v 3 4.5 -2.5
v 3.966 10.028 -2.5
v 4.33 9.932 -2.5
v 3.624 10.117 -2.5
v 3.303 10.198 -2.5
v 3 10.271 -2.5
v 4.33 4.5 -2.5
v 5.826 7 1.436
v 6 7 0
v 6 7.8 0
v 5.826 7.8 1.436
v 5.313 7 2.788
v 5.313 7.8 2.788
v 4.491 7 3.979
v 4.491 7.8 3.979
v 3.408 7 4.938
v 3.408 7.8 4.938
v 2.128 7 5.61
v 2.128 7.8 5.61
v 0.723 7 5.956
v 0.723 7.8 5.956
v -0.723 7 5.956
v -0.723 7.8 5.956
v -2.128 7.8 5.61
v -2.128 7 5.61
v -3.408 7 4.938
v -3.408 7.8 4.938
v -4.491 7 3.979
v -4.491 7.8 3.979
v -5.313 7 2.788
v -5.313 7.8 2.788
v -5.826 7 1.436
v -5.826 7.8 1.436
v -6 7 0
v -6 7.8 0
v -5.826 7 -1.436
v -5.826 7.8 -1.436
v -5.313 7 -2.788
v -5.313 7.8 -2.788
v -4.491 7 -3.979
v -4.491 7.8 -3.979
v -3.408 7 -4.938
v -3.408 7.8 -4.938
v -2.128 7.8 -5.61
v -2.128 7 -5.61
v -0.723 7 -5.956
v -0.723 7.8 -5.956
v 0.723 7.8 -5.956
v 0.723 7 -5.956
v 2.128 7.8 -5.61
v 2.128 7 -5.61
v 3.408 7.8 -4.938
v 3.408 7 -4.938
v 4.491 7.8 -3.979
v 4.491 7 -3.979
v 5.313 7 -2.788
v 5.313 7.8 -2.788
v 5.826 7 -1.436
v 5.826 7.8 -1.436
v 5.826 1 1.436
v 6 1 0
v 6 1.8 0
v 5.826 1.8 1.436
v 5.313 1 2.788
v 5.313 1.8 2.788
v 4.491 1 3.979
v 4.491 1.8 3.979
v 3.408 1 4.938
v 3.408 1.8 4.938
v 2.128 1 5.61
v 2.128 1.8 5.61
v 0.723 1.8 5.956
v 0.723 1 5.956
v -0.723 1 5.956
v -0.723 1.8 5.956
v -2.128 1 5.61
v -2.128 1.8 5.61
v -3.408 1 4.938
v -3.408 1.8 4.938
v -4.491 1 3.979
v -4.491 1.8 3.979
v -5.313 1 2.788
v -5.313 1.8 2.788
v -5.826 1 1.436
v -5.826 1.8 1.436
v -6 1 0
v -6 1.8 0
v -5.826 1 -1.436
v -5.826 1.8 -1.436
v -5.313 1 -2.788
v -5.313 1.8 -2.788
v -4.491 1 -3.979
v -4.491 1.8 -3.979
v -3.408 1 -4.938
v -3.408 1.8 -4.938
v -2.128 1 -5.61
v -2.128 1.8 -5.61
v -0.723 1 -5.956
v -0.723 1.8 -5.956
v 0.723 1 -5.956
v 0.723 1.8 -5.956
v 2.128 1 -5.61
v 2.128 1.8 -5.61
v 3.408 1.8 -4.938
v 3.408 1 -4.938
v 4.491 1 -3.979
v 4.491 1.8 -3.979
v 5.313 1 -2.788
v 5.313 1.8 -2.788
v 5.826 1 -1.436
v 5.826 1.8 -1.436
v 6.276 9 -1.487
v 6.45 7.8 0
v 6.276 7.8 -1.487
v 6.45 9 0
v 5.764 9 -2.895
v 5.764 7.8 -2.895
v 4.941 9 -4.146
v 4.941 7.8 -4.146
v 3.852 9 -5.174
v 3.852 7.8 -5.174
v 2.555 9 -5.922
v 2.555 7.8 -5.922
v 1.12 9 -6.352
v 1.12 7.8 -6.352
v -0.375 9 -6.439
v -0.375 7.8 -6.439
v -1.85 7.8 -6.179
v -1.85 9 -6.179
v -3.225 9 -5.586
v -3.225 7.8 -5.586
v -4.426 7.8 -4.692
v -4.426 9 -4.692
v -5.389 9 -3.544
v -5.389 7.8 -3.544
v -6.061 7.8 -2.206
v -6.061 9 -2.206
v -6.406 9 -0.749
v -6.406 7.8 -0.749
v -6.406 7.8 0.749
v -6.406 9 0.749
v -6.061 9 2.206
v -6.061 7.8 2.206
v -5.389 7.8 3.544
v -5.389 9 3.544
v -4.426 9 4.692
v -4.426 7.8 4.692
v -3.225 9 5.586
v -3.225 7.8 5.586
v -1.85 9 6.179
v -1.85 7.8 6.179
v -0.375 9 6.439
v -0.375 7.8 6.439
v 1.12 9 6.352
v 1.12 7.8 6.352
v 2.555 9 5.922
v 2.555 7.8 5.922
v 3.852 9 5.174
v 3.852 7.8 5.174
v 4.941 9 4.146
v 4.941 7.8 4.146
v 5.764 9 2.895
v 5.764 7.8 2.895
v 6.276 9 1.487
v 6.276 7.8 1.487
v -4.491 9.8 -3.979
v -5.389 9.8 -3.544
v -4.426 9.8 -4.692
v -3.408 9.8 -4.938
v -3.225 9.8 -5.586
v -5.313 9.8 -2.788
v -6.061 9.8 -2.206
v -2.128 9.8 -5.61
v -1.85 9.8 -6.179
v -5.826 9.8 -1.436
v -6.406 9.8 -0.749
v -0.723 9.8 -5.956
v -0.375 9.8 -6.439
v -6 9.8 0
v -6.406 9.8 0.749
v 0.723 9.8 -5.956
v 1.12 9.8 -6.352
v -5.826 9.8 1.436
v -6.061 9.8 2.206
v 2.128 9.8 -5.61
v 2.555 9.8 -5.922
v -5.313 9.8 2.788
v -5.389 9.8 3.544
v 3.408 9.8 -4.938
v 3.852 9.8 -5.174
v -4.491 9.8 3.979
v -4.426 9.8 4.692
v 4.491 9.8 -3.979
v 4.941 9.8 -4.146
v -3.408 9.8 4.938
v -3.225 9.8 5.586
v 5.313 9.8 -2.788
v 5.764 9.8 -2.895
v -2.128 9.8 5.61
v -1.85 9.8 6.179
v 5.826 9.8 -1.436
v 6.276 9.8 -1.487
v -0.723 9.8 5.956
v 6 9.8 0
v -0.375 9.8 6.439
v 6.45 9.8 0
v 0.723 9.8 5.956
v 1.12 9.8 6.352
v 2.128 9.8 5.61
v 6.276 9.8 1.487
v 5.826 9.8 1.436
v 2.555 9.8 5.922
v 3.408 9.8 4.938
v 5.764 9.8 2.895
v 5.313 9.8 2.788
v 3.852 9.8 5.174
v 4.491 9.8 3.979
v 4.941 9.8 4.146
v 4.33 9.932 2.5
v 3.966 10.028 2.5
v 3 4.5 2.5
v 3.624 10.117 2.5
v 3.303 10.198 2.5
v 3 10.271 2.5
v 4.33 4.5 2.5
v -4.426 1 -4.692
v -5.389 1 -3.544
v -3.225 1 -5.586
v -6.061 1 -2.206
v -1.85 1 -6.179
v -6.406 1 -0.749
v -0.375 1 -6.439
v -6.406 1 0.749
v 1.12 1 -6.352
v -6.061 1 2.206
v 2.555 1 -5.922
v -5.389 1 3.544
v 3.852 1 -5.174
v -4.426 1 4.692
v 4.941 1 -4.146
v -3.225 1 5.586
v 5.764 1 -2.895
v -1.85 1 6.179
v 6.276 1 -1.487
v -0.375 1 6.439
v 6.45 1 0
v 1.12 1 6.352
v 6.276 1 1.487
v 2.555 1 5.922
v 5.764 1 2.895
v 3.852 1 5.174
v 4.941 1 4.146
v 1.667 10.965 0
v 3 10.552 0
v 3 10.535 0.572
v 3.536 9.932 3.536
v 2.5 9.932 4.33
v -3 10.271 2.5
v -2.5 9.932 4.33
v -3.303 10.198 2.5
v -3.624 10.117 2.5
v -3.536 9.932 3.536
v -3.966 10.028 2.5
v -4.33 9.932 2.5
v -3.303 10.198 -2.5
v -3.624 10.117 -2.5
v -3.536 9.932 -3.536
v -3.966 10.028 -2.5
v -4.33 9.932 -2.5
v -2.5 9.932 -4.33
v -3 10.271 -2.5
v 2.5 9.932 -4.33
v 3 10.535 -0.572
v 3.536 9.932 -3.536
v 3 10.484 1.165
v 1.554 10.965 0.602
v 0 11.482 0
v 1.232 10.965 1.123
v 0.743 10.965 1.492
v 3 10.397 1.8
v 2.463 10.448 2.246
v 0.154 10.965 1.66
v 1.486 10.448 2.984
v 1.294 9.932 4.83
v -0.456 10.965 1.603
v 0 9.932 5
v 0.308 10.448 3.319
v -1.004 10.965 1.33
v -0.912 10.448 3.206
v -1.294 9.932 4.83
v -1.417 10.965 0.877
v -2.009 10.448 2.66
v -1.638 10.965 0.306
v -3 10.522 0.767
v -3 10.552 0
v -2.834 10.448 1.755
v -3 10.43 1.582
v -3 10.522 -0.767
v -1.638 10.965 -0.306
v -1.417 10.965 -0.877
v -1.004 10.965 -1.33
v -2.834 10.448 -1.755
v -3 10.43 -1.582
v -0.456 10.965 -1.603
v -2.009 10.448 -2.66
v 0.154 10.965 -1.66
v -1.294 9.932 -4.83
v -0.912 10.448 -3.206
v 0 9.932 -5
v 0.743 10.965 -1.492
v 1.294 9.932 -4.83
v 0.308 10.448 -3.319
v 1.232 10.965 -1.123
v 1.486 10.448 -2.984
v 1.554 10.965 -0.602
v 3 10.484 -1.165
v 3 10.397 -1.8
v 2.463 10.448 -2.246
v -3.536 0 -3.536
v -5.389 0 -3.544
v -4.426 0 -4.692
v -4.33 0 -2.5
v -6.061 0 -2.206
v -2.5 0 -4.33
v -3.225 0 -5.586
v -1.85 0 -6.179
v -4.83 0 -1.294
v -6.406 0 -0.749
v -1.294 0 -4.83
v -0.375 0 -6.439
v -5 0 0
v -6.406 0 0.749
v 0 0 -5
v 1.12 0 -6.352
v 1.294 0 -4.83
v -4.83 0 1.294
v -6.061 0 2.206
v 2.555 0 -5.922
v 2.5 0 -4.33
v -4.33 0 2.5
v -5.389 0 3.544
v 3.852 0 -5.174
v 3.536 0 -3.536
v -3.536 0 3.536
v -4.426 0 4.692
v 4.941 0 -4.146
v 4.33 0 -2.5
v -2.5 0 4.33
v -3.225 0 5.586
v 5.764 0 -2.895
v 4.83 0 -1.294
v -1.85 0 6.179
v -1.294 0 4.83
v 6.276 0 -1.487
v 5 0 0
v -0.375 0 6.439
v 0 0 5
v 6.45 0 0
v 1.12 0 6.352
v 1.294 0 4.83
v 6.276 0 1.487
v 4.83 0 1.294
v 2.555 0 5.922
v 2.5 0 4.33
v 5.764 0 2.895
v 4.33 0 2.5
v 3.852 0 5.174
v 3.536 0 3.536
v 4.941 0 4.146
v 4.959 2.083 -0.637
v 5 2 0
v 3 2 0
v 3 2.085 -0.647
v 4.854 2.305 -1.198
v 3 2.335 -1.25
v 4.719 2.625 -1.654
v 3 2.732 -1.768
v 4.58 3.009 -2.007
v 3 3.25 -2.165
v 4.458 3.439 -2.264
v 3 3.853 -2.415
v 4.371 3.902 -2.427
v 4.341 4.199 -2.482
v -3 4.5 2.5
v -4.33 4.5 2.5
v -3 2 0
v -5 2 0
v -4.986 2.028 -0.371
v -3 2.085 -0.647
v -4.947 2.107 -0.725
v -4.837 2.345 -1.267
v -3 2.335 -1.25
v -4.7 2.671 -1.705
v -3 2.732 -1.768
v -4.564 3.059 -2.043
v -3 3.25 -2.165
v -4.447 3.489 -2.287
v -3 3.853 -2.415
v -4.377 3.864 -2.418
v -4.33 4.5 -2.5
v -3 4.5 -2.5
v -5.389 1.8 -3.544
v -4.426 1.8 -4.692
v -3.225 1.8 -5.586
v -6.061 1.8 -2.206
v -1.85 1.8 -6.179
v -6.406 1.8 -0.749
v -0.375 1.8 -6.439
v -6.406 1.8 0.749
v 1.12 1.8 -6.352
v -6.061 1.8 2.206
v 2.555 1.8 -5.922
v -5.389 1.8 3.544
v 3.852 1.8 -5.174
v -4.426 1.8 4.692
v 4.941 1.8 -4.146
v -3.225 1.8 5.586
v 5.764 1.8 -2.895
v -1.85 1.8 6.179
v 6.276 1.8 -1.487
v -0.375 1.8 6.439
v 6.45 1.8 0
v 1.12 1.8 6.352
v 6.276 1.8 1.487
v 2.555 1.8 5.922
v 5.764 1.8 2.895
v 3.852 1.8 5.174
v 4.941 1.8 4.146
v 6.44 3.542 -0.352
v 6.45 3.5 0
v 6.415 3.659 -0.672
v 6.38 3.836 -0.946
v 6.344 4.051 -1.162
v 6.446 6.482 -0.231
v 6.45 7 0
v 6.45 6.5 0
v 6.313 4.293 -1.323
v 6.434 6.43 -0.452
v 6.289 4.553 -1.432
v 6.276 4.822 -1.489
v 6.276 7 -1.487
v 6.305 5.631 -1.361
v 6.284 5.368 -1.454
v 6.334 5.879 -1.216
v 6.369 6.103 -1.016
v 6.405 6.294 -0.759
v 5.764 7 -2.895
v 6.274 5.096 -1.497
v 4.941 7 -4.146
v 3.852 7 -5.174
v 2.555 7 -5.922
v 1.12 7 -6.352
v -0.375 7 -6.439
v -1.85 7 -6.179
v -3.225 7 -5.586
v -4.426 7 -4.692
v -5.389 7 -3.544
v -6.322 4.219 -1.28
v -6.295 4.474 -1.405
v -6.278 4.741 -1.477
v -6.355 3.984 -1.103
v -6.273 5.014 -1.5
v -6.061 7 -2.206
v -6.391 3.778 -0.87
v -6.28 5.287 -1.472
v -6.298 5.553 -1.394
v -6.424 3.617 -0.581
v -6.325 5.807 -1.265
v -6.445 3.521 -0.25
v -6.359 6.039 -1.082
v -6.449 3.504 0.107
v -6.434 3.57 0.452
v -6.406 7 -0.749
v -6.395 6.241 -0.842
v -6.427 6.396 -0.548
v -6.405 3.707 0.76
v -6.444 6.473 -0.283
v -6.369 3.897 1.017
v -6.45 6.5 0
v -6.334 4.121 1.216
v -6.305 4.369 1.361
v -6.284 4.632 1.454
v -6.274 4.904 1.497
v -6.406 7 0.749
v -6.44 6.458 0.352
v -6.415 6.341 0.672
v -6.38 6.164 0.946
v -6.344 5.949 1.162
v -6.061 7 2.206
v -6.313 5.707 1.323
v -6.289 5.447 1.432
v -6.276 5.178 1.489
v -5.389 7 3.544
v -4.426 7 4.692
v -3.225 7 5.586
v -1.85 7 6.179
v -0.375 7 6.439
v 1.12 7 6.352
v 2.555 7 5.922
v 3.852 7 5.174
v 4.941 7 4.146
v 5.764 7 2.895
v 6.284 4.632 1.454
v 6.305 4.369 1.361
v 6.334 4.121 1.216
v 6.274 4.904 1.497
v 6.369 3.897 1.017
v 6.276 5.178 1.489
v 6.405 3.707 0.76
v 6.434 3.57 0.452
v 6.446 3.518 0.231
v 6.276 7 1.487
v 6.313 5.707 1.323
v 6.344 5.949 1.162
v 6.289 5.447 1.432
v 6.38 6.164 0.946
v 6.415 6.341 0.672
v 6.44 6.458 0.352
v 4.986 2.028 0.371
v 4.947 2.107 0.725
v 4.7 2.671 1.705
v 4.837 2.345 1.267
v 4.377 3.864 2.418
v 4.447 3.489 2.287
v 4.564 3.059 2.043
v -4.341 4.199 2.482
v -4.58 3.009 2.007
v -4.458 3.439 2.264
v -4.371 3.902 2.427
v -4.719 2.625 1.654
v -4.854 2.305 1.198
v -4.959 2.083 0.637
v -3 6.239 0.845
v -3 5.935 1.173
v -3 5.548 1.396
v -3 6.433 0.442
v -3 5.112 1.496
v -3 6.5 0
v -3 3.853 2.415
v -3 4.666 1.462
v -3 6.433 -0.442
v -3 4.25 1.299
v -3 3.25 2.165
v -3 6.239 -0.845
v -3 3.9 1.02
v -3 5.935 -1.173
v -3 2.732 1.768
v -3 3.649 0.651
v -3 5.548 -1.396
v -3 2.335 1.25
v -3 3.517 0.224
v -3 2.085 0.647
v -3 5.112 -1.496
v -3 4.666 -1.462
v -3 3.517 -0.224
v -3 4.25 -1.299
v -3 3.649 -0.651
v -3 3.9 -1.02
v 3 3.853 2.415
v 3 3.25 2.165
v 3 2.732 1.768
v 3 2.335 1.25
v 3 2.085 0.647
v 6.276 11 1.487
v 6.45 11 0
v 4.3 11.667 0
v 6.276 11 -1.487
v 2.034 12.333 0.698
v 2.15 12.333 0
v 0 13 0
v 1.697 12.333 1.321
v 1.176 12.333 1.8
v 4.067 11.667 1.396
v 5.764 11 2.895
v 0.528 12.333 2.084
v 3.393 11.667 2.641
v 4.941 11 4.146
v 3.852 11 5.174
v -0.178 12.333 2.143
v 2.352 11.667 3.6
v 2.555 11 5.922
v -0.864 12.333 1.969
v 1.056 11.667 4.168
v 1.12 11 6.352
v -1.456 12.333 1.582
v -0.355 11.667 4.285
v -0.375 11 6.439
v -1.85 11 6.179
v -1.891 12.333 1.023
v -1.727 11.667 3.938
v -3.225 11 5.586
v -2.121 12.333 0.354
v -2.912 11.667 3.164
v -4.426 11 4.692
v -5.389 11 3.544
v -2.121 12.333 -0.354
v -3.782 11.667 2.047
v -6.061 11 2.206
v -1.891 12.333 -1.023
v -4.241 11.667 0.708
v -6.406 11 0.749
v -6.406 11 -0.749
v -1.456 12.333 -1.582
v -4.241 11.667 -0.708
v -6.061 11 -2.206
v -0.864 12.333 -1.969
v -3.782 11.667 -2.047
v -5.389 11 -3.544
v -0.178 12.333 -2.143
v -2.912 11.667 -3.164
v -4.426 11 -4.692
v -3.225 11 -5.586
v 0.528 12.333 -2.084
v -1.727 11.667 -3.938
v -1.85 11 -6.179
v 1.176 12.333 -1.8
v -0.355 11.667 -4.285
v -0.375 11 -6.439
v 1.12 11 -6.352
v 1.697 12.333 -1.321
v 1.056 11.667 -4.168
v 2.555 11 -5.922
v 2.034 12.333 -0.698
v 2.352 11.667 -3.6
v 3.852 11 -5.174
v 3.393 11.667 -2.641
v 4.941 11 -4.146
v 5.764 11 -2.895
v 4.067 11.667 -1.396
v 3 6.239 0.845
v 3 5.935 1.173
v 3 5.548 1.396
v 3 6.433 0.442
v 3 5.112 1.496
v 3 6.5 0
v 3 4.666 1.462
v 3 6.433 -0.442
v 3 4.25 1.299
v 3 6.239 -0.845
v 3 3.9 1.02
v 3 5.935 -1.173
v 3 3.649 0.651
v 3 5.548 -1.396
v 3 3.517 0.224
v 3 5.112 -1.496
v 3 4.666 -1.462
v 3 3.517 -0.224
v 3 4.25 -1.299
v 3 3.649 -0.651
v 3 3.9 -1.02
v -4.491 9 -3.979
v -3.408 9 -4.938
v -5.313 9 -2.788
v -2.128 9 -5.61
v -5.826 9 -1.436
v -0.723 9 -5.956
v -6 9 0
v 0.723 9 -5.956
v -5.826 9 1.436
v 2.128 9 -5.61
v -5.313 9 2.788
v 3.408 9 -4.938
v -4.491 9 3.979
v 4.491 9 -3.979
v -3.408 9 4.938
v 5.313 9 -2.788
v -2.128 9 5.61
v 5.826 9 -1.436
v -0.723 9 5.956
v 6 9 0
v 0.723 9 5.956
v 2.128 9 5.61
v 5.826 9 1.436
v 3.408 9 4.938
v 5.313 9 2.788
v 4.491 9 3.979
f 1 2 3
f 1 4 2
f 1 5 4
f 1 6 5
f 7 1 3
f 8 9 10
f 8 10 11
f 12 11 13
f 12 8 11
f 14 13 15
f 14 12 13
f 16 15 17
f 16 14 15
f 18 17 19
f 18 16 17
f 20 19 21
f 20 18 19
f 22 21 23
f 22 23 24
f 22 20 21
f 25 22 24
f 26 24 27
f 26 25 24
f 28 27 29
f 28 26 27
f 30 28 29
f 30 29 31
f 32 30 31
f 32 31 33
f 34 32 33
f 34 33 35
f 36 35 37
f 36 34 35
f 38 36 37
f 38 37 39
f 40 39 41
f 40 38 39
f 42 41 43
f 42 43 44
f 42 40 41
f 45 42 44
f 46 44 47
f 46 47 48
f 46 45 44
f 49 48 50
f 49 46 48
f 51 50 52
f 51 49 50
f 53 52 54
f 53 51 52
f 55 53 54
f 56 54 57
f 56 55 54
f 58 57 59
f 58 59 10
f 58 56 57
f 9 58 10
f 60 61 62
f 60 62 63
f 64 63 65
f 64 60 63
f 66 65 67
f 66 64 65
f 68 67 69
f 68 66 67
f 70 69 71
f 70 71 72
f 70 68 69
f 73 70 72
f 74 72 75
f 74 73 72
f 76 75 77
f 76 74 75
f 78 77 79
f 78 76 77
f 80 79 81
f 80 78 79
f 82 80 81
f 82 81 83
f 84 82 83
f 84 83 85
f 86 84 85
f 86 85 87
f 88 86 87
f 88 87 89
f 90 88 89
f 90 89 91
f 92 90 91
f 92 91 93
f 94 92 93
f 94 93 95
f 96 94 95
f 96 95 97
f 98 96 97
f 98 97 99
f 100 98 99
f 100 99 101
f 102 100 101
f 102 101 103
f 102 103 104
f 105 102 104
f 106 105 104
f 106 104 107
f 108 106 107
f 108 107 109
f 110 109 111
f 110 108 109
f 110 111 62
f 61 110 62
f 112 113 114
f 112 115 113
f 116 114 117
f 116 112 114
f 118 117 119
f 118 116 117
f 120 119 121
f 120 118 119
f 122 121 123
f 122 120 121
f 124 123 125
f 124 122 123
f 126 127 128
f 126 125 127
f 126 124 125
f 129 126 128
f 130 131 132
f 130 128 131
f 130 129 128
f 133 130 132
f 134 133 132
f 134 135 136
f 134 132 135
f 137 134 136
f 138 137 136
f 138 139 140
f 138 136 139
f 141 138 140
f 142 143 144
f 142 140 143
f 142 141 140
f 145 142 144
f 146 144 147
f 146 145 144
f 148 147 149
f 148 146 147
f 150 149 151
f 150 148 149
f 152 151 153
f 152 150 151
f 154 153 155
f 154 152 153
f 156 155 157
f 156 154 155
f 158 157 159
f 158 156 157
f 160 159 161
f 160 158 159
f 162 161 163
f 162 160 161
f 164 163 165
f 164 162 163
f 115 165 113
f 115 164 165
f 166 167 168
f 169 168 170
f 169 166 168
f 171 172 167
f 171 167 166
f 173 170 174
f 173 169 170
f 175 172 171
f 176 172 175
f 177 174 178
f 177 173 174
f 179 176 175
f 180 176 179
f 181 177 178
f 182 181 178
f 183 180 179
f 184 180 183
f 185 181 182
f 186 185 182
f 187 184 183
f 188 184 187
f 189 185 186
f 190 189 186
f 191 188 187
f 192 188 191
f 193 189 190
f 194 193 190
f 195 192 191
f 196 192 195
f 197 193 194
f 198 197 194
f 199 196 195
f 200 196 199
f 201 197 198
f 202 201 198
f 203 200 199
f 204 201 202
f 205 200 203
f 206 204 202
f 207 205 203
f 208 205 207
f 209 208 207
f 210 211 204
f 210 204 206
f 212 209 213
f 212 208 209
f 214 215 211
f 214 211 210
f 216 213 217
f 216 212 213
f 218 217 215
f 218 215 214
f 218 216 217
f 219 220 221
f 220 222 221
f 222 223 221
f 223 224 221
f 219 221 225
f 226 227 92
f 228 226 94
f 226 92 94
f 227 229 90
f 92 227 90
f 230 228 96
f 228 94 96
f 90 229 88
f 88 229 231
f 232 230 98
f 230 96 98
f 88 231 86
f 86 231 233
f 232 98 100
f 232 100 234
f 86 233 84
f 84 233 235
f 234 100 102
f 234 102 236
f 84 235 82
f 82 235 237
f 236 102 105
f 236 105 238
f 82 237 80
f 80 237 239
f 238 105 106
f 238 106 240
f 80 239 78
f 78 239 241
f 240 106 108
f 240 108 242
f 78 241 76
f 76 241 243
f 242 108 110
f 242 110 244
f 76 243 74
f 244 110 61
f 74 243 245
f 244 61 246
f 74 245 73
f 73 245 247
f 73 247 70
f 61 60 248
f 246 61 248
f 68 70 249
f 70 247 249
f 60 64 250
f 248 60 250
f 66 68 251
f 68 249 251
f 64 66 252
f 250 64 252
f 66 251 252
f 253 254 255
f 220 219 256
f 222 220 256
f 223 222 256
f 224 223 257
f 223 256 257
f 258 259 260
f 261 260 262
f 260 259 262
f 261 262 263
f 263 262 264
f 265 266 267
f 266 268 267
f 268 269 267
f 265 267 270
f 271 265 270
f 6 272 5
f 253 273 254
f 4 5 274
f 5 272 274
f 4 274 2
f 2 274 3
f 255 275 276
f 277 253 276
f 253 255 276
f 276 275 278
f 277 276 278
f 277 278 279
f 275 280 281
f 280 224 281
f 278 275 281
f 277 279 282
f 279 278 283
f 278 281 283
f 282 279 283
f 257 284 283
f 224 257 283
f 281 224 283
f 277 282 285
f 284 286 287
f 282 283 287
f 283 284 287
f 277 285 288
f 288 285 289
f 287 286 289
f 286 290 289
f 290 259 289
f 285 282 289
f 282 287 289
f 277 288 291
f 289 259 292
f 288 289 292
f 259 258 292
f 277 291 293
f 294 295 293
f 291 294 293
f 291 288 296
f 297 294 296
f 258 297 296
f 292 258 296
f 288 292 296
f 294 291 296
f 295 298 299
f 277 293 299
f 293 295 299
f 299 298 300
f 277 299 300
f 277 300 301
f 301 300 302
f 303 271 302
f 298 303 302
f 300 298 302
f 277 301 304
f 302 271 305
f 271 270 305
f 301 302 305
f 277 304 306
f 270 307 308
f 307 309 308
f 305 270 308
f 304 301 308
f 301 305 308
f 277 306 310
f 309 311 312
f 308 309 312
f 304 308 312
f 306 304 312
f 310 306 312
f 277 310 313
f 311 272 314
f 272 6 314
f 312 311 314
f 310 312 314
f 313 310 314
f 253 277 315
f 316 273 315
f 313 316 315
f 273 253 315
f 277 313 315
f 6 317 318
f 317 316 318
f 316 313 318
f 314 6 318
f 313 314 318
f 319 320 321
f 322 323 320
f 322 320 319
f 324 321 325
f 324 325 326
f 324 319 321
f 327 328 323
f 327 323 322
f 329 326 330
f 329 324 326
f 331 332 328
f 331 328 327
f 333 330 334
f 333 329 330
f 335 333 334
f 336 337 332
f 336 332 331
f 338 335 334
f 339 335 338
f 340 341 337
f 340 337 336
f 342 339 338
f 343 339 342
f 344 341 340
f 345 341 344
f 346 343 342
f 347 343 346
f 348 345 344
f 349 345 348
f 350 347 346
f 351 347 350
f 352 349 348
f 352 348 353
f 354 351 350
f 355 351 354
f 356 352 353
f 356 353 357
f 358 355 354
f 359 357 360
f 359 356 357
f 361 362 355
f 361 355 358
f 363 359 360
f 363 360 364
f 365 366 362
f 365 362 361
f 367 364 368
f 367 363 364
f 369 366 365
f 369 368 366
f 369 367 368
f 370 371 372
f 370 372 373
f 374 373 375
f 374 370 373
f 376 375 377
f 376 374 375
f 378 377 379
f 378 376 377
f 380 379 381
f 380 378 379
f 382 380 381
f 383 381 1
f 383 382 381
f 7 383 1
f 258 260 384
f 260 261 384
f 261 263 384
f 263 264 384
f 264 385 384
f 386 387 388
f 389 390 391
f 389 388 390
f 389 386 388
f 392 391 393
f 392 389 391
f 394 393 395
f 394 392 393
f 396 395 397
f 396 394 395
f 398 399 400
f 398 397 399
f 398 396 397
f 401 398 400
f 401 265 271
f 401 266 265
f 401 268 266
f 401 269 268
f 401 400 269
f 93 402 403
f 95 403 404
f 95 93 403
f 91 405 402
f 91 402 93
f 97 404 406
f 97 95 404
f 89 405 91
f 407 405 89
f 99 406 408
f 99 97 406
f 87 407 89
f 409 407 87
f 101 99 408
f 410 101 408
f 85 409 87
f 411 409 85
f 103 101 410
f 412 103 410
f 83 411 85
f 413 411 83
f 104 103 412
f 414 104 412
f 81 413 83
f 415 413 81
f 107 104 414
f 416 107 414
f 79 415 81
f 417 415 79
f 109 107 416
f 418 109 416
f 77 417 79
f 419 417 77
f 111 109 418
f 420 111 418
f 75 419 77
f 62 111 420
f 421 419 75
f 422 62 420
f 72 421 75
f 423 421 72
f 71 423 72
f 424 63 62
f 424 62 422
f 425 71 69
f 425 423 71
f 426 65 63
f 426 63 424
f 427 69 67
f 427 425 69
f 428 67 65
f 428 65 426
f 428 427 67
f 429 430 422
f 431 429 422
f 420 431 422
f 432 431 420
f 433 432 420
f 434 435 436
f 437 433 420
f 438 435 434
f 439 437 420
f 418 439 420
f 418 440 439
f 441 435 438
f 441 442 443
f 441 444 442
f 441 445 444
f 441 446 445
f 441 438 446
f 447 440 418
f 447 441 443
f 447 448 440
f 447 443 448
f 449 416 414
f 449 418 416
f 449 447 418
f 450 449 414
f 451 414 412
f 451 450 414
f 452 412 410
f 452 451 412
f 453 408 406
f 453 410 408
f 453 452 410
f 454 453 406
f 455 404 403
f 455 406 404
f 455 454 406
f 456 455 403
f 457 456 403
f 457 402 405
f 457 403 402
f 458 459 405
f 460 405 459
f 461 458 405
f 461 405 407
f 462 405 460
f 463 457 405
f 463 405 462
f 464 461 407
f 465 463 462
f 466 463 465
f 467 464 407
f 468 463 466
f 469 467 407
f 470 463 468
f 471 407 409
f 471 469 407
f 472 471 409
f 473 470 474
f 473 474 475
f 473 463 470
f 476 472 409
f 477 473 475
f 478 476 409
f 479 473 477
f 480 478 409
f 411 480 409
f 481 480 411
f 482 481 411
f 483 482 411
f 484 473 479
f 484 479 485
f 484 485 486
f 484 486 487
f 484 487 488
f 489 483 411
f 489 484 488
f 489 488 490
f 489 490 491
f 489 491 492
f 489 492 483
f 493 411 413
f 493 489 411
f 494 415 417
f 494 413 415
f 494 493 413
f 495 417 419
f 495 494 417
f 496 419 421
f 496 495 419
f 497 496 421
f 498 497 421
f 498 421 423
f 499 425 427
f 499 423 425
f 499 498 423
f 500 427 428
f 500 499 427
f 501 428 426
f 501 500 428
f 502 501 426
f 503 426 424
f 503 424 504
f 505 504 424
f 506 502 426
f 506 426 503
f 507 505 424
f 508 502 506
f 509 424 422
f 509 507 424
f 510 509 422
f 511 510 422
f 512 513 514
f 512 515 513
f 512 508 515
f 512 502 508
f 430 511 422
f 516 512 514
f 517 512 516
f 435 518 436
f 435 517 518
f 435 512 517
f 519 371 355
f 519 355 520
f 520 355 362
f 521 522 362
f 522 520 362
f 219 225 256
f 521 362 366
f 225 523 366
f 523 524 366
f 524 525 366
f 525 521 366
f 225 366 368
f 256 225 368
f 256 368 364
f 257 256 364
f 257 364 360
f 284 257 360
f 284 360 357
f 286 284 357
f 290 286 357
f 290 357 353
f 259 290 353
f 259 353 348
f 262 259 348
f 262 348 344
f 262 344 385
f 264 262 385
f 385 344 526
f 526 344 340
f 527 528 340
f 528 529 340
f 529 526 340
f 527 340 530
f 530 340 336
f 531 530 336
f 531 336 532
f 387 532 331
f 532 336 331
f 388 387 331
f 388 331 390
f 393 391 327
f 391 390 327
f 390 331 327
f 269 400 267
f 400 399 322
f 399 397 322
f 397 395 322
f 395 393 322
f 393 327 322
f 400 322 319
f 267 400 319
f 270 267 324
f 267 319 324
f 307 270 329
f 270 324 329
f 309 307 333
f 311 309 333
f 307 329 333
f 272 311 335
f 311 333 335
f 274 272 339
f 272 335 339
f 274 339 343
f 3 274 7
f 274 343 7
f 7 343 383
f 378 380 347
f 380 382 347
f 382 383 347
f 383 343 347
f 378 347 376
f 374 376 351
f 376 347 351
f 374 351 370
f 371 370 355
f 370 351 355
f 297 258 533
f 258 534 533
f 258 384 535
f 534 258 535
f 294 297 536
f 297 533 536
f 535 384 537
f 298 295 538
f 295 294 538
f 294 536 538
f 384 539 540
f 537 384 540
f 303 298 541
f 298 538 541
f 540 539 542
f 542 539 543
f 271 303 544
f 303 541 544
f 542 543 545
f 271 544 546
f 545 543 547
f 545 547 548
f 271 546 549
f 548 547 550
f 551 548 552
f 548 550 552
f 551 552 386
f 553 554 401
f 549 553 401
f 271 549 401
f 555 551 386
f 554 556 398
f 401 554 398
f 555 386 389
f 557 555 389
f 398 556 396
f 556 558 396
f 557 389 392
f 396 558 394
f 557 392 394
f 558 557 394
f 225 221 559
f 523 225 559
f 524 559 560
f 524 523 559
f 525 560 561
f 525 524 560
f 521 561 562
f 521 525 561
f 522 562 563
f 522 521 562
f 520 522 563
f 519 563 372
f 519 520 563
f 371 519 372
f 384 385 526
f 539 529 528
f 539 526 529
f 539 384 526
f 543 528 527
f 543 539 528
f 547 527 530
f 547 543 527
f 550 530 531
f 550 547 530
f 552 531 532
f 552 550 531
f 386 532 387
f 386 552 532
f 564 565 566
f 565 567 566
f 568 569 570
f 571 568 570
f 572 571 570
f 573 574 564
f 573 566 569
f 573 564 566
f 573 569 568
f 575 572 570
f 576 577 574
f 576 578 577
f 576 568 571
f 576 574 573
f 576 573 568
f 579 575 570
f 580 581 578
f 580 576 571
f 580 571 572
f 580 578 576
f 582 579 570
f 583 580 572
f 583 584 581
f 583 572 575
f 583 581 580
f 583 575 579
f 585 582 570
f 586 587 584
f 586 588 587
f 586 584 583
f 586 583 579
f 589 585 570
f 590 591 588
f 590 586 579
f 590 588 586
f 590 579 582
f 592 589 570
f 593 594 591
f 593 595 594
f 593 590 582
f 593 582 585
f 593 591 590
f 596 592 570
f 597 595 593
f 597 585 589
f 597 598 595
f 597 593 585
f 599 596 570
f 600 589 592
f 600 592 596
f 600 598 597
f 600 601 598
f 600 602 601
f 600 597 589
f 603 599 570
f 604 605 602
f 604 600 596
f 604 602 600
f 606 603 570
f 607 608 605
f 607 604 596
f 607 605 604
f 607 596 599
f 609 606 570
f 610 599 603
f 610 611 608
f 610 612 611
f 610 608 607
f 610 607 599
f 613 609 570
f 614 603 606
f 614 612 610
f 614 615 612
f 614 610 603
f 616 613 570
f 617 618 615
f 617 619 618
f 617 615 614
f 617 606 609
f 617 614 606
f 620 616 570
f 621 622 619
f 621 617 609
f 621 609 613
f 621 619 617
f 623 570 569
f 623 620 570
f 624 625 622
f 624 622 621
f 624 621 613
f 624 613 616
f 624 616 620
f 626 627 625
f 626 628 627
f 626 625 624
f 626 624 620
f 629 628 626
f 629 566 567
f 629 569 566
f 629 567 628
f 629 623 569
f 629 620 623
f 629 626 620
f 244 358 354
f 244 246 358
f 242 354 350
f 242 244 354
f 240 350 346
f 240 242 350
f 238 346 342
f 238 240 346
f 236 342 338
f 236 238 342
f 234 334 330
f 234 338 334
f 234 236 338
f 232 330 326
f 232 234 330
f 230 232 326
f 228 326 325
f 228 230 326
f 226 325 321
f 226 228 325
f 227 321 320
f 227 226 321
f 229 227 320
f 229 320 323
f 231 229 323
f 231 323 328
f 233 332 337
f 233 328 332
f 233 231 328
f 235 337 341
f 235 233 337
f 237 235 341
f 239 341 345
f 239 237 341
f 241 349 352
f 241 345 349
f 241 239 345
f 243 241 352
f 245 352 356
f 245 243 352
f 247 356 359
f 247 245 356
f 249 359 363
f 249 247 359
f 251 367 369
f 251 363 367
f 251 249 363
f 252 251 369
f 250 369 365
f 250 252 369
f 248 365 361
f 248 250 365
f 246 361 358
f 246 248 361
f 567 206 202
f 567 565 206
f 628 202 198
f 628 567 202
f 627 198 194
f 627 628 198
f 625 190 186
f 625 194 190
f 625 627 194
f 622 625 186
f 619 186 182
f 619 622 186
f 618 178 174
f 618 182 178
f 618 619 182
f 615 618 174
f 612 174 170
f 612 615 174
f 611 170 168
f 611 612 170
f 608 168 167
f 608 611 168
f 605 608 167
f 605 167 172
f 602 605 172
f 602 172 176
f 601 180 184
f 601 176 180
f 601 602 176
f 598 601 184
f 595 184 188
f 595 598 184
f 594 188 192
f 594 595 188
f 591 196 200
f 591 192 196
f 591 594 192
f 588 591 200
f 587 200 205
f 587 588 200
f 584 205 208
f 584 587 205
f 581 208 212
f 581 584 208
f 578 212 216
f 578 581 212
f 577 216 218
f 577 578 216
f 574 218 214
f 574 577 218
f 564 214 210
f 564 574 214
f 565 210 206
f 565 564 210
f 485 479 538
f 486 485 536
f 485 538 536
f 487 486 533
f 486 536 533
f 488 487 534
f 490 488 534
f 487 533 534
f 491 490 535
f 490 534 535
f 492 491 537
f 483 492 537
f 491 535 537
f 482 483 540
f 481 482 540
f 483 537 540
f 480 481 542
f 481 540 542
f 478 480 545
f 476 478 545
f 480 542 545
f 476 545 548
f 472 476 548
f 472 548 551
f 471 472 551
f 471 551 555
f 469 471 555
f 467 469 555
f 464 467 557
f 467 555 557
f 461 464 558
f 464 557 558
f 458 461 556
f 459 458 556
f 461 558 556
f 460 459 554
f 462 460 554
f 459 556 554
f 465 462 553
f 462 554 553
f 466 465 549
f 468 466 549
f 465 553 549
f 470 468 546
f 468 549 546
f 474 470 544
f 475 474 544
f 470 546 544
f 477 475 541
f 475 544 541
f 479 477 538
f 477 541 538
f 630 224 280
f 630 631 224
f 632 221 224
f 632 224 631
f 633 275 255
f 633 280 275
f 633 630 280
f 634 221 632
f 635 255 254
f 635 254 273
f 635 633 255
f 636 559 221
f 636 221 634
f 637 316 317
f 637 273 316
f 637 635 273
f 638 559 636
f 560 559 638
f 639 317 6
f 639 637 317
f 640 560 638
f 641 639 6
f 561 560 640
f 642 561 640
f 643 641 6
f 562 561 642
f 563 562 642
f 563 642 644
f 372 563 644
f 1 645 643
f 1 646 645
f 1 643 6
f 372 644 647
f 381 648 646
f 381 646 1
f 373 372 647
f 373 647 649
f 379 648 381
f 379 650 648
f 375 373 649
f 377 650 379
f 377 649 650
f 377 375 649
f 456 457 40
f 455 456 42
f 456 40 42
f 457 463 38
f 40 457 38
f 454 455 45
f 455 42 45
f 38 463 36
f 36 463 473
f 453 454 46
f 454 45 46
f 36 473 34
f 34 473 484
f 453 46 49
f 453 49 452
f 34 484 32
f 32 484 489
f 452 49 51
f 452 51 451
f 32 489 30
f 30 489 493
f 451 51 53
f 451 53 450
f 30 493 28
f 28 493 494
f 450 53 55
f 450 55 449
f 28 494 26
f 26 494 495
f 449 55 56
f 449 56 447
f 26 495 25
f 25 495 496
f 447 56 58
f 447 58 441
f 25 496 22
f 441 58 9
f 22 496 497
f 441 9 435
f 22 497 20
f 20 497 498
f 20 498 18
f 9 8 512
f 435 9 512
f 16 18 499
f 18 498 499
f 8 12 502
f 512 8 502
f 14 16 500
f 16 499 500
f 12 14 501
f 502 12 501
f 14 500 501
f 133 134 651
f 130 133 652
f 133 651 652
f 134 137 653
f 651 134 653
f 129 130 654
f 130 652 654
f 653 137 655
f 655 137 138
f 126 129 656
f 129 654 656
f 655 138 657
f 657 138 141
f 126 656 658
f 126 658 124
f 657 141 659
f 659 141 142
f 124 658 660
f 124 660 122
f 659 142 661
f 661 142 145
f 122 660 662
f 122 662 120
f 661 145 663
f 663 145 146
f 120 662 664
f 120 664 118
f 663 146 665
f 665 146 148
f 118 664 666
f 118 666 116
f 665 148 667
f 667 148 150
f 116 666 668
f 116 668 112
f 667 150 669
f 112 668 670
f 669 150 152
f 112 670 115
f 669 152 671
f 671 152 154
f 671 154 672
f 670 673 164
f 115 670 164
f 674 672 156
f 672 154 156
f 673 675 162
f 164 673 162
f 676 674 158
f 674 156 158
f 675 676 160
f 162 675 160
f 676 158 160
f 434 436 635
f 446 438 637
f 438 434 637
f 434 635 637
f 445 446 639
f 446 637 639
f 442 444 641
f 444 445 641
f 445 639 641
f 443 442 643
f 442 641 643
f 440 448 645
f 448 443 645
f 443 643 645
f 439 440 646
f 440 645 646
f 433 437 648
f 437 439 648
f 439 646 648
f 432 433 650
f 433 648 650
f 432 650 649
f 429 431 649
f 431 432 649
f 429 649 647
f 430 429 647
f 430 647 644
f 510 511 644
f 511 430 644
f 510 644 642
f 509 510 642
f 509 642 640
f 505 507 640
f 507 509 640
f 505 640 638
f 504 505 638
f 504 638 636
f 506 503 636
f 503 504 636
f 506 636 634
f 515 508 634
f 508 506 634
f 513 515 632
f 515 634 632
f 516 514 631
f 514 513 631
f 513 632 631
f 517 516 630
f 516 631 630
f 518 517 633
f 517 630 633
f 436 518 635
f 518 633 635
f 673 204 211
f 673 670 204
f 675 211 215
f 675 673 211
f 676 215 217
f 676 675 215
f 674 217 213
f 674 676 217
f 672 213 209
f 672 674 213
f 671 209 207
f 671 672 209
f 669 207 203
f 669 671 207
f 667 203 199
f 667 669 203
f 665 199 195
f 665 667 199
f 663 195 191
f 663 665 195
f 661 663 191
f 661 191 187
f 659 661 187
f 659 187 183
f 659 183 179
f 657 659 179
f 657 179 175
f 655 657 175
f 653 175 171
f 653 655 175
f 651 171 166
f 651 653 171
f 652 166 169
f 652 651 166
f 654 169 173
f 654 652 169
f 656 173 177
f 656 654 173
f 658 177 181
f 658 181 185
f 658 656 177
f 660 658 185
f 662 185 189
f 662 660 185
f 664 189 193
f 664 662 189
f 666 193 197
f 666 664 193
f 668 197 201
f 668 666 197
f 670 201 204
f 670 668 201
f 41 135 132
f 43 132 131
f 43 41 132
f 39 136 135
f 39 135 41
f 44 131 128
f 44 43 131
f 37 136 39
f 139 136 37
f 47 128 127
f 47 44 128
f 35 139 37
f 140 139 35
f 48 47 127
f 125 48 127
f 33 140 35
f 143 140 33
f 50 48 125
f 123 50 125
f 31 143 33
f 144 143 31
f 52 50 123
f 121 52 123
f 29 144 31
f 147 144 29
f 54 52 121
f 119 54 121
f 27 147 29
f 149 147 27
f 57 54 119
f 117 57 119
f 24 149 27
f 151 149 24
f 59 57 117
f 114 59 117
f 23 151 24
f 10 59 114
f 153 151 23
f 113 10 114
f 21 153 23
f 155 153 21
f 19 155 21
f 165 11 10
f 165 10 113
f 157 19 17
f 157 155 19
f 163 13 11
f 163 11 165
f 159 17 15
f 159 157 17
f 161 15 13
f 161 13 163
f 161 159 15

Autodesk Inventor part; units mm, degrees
ref_plane "YZ Plane" through (0, 0, 0) normal (1, 0, 0) x (0, 1, 0)
ref_plane "XY Plane" through (0, 0, 0) normal (0, 0, 1) x (1, 0, 0)
sketch "Sketch1" plane through (0, 0, 0) normal (0, 0, 1) x (1, 0, 0)
  line L0 (5, 0) -> (6.45, 0)
  line L1 (0, 13) -> (0, 11.4819)
  line L2 (6, 1) -> (6.45, 1)
  line L3 (6, 1.8) -> (6.45, 1.8)
  line L4 (6, 1.8) -> (6, 1)
  line L5 (6.45, 0) -> (6.45, 1)
  line L6 (6, 7) -> (6.45, 7)
  line L7 (6, 7.8) -> (6.45, 7.8)
  line L8 (6, 7.8) -> (6, 7)
  line L9 (6.45, 1.8) -> (6.45, 7)
  line L10 (6, 9) -> (6.45, 9)
  line L11 (6, 9.8) -> (6.45, 9.8)
  line L12 (6, 9.8) -> (6, 9)
  line L13 (6.45, 7.8) -> (6.45, 9)
  line L14 (6.45, 9.8) -> (6.45, 11)
  line L15 (0, 13) -> (6.45, 11)
  line L16 (5, 9.9315) -> (5, 0)
  line L17 (0, 11.4819) -> (5, 9.9315)
  point P0 (0, 0)
revolve "Revolution1" add sketch "Sketch1" angle 360 about axis through (0, 13, 0) along (0, -1, 0)
ref_plane "Work Plane1" through (0, 2, 0) normal (0, 1, 0) x (-1, 0, 0)
sketch "Sketch2" plane through (0, 2, 0) normal (0, 1, 0) x (-1, 0, 0)
  line L0 (-3, 2.5) -> (-3, -2.5)
  line L1 (3, 2.5) -> (3, -2.5)
  line L2 (4.3301, 2.5) -> (3, 2.5)
  line L3 (-3, 2.5) -> (-4.3301, 2.5)
  line L4 (4.3301, -2.5) -> (3, -2.5)
  line L5 (-3, -2.5) -> (-4.3301, -2.5)
  arc A0 (-4.3301, 2.5) -> (-4.3301, -2.5) centre (0, 0) ccw
  arc A1 (4.3301, -2.5) -> (4.3301, 2.5) centre (0, 0) ccw
extrude "Extrusion1" add sketch "Sketch2" along normal blind 9
fillet "Fillet1" radius 2.5 4 edges at (-3.6651, 2, 2.5) (-3.6651, 2, -2.5) (3.6651, 2, 2.5) (3.6651, 2, -2.5)
sketch "Sketch3" plane through (0, 0, 0) normal (1, 0, 0) x (0, 1, 0)
  circle A0 centre (5, 0) radius 1.5
extrude "Extrusion2" cut sketch "Sketch3" along normal mid plane 20
properties part number "piston"
